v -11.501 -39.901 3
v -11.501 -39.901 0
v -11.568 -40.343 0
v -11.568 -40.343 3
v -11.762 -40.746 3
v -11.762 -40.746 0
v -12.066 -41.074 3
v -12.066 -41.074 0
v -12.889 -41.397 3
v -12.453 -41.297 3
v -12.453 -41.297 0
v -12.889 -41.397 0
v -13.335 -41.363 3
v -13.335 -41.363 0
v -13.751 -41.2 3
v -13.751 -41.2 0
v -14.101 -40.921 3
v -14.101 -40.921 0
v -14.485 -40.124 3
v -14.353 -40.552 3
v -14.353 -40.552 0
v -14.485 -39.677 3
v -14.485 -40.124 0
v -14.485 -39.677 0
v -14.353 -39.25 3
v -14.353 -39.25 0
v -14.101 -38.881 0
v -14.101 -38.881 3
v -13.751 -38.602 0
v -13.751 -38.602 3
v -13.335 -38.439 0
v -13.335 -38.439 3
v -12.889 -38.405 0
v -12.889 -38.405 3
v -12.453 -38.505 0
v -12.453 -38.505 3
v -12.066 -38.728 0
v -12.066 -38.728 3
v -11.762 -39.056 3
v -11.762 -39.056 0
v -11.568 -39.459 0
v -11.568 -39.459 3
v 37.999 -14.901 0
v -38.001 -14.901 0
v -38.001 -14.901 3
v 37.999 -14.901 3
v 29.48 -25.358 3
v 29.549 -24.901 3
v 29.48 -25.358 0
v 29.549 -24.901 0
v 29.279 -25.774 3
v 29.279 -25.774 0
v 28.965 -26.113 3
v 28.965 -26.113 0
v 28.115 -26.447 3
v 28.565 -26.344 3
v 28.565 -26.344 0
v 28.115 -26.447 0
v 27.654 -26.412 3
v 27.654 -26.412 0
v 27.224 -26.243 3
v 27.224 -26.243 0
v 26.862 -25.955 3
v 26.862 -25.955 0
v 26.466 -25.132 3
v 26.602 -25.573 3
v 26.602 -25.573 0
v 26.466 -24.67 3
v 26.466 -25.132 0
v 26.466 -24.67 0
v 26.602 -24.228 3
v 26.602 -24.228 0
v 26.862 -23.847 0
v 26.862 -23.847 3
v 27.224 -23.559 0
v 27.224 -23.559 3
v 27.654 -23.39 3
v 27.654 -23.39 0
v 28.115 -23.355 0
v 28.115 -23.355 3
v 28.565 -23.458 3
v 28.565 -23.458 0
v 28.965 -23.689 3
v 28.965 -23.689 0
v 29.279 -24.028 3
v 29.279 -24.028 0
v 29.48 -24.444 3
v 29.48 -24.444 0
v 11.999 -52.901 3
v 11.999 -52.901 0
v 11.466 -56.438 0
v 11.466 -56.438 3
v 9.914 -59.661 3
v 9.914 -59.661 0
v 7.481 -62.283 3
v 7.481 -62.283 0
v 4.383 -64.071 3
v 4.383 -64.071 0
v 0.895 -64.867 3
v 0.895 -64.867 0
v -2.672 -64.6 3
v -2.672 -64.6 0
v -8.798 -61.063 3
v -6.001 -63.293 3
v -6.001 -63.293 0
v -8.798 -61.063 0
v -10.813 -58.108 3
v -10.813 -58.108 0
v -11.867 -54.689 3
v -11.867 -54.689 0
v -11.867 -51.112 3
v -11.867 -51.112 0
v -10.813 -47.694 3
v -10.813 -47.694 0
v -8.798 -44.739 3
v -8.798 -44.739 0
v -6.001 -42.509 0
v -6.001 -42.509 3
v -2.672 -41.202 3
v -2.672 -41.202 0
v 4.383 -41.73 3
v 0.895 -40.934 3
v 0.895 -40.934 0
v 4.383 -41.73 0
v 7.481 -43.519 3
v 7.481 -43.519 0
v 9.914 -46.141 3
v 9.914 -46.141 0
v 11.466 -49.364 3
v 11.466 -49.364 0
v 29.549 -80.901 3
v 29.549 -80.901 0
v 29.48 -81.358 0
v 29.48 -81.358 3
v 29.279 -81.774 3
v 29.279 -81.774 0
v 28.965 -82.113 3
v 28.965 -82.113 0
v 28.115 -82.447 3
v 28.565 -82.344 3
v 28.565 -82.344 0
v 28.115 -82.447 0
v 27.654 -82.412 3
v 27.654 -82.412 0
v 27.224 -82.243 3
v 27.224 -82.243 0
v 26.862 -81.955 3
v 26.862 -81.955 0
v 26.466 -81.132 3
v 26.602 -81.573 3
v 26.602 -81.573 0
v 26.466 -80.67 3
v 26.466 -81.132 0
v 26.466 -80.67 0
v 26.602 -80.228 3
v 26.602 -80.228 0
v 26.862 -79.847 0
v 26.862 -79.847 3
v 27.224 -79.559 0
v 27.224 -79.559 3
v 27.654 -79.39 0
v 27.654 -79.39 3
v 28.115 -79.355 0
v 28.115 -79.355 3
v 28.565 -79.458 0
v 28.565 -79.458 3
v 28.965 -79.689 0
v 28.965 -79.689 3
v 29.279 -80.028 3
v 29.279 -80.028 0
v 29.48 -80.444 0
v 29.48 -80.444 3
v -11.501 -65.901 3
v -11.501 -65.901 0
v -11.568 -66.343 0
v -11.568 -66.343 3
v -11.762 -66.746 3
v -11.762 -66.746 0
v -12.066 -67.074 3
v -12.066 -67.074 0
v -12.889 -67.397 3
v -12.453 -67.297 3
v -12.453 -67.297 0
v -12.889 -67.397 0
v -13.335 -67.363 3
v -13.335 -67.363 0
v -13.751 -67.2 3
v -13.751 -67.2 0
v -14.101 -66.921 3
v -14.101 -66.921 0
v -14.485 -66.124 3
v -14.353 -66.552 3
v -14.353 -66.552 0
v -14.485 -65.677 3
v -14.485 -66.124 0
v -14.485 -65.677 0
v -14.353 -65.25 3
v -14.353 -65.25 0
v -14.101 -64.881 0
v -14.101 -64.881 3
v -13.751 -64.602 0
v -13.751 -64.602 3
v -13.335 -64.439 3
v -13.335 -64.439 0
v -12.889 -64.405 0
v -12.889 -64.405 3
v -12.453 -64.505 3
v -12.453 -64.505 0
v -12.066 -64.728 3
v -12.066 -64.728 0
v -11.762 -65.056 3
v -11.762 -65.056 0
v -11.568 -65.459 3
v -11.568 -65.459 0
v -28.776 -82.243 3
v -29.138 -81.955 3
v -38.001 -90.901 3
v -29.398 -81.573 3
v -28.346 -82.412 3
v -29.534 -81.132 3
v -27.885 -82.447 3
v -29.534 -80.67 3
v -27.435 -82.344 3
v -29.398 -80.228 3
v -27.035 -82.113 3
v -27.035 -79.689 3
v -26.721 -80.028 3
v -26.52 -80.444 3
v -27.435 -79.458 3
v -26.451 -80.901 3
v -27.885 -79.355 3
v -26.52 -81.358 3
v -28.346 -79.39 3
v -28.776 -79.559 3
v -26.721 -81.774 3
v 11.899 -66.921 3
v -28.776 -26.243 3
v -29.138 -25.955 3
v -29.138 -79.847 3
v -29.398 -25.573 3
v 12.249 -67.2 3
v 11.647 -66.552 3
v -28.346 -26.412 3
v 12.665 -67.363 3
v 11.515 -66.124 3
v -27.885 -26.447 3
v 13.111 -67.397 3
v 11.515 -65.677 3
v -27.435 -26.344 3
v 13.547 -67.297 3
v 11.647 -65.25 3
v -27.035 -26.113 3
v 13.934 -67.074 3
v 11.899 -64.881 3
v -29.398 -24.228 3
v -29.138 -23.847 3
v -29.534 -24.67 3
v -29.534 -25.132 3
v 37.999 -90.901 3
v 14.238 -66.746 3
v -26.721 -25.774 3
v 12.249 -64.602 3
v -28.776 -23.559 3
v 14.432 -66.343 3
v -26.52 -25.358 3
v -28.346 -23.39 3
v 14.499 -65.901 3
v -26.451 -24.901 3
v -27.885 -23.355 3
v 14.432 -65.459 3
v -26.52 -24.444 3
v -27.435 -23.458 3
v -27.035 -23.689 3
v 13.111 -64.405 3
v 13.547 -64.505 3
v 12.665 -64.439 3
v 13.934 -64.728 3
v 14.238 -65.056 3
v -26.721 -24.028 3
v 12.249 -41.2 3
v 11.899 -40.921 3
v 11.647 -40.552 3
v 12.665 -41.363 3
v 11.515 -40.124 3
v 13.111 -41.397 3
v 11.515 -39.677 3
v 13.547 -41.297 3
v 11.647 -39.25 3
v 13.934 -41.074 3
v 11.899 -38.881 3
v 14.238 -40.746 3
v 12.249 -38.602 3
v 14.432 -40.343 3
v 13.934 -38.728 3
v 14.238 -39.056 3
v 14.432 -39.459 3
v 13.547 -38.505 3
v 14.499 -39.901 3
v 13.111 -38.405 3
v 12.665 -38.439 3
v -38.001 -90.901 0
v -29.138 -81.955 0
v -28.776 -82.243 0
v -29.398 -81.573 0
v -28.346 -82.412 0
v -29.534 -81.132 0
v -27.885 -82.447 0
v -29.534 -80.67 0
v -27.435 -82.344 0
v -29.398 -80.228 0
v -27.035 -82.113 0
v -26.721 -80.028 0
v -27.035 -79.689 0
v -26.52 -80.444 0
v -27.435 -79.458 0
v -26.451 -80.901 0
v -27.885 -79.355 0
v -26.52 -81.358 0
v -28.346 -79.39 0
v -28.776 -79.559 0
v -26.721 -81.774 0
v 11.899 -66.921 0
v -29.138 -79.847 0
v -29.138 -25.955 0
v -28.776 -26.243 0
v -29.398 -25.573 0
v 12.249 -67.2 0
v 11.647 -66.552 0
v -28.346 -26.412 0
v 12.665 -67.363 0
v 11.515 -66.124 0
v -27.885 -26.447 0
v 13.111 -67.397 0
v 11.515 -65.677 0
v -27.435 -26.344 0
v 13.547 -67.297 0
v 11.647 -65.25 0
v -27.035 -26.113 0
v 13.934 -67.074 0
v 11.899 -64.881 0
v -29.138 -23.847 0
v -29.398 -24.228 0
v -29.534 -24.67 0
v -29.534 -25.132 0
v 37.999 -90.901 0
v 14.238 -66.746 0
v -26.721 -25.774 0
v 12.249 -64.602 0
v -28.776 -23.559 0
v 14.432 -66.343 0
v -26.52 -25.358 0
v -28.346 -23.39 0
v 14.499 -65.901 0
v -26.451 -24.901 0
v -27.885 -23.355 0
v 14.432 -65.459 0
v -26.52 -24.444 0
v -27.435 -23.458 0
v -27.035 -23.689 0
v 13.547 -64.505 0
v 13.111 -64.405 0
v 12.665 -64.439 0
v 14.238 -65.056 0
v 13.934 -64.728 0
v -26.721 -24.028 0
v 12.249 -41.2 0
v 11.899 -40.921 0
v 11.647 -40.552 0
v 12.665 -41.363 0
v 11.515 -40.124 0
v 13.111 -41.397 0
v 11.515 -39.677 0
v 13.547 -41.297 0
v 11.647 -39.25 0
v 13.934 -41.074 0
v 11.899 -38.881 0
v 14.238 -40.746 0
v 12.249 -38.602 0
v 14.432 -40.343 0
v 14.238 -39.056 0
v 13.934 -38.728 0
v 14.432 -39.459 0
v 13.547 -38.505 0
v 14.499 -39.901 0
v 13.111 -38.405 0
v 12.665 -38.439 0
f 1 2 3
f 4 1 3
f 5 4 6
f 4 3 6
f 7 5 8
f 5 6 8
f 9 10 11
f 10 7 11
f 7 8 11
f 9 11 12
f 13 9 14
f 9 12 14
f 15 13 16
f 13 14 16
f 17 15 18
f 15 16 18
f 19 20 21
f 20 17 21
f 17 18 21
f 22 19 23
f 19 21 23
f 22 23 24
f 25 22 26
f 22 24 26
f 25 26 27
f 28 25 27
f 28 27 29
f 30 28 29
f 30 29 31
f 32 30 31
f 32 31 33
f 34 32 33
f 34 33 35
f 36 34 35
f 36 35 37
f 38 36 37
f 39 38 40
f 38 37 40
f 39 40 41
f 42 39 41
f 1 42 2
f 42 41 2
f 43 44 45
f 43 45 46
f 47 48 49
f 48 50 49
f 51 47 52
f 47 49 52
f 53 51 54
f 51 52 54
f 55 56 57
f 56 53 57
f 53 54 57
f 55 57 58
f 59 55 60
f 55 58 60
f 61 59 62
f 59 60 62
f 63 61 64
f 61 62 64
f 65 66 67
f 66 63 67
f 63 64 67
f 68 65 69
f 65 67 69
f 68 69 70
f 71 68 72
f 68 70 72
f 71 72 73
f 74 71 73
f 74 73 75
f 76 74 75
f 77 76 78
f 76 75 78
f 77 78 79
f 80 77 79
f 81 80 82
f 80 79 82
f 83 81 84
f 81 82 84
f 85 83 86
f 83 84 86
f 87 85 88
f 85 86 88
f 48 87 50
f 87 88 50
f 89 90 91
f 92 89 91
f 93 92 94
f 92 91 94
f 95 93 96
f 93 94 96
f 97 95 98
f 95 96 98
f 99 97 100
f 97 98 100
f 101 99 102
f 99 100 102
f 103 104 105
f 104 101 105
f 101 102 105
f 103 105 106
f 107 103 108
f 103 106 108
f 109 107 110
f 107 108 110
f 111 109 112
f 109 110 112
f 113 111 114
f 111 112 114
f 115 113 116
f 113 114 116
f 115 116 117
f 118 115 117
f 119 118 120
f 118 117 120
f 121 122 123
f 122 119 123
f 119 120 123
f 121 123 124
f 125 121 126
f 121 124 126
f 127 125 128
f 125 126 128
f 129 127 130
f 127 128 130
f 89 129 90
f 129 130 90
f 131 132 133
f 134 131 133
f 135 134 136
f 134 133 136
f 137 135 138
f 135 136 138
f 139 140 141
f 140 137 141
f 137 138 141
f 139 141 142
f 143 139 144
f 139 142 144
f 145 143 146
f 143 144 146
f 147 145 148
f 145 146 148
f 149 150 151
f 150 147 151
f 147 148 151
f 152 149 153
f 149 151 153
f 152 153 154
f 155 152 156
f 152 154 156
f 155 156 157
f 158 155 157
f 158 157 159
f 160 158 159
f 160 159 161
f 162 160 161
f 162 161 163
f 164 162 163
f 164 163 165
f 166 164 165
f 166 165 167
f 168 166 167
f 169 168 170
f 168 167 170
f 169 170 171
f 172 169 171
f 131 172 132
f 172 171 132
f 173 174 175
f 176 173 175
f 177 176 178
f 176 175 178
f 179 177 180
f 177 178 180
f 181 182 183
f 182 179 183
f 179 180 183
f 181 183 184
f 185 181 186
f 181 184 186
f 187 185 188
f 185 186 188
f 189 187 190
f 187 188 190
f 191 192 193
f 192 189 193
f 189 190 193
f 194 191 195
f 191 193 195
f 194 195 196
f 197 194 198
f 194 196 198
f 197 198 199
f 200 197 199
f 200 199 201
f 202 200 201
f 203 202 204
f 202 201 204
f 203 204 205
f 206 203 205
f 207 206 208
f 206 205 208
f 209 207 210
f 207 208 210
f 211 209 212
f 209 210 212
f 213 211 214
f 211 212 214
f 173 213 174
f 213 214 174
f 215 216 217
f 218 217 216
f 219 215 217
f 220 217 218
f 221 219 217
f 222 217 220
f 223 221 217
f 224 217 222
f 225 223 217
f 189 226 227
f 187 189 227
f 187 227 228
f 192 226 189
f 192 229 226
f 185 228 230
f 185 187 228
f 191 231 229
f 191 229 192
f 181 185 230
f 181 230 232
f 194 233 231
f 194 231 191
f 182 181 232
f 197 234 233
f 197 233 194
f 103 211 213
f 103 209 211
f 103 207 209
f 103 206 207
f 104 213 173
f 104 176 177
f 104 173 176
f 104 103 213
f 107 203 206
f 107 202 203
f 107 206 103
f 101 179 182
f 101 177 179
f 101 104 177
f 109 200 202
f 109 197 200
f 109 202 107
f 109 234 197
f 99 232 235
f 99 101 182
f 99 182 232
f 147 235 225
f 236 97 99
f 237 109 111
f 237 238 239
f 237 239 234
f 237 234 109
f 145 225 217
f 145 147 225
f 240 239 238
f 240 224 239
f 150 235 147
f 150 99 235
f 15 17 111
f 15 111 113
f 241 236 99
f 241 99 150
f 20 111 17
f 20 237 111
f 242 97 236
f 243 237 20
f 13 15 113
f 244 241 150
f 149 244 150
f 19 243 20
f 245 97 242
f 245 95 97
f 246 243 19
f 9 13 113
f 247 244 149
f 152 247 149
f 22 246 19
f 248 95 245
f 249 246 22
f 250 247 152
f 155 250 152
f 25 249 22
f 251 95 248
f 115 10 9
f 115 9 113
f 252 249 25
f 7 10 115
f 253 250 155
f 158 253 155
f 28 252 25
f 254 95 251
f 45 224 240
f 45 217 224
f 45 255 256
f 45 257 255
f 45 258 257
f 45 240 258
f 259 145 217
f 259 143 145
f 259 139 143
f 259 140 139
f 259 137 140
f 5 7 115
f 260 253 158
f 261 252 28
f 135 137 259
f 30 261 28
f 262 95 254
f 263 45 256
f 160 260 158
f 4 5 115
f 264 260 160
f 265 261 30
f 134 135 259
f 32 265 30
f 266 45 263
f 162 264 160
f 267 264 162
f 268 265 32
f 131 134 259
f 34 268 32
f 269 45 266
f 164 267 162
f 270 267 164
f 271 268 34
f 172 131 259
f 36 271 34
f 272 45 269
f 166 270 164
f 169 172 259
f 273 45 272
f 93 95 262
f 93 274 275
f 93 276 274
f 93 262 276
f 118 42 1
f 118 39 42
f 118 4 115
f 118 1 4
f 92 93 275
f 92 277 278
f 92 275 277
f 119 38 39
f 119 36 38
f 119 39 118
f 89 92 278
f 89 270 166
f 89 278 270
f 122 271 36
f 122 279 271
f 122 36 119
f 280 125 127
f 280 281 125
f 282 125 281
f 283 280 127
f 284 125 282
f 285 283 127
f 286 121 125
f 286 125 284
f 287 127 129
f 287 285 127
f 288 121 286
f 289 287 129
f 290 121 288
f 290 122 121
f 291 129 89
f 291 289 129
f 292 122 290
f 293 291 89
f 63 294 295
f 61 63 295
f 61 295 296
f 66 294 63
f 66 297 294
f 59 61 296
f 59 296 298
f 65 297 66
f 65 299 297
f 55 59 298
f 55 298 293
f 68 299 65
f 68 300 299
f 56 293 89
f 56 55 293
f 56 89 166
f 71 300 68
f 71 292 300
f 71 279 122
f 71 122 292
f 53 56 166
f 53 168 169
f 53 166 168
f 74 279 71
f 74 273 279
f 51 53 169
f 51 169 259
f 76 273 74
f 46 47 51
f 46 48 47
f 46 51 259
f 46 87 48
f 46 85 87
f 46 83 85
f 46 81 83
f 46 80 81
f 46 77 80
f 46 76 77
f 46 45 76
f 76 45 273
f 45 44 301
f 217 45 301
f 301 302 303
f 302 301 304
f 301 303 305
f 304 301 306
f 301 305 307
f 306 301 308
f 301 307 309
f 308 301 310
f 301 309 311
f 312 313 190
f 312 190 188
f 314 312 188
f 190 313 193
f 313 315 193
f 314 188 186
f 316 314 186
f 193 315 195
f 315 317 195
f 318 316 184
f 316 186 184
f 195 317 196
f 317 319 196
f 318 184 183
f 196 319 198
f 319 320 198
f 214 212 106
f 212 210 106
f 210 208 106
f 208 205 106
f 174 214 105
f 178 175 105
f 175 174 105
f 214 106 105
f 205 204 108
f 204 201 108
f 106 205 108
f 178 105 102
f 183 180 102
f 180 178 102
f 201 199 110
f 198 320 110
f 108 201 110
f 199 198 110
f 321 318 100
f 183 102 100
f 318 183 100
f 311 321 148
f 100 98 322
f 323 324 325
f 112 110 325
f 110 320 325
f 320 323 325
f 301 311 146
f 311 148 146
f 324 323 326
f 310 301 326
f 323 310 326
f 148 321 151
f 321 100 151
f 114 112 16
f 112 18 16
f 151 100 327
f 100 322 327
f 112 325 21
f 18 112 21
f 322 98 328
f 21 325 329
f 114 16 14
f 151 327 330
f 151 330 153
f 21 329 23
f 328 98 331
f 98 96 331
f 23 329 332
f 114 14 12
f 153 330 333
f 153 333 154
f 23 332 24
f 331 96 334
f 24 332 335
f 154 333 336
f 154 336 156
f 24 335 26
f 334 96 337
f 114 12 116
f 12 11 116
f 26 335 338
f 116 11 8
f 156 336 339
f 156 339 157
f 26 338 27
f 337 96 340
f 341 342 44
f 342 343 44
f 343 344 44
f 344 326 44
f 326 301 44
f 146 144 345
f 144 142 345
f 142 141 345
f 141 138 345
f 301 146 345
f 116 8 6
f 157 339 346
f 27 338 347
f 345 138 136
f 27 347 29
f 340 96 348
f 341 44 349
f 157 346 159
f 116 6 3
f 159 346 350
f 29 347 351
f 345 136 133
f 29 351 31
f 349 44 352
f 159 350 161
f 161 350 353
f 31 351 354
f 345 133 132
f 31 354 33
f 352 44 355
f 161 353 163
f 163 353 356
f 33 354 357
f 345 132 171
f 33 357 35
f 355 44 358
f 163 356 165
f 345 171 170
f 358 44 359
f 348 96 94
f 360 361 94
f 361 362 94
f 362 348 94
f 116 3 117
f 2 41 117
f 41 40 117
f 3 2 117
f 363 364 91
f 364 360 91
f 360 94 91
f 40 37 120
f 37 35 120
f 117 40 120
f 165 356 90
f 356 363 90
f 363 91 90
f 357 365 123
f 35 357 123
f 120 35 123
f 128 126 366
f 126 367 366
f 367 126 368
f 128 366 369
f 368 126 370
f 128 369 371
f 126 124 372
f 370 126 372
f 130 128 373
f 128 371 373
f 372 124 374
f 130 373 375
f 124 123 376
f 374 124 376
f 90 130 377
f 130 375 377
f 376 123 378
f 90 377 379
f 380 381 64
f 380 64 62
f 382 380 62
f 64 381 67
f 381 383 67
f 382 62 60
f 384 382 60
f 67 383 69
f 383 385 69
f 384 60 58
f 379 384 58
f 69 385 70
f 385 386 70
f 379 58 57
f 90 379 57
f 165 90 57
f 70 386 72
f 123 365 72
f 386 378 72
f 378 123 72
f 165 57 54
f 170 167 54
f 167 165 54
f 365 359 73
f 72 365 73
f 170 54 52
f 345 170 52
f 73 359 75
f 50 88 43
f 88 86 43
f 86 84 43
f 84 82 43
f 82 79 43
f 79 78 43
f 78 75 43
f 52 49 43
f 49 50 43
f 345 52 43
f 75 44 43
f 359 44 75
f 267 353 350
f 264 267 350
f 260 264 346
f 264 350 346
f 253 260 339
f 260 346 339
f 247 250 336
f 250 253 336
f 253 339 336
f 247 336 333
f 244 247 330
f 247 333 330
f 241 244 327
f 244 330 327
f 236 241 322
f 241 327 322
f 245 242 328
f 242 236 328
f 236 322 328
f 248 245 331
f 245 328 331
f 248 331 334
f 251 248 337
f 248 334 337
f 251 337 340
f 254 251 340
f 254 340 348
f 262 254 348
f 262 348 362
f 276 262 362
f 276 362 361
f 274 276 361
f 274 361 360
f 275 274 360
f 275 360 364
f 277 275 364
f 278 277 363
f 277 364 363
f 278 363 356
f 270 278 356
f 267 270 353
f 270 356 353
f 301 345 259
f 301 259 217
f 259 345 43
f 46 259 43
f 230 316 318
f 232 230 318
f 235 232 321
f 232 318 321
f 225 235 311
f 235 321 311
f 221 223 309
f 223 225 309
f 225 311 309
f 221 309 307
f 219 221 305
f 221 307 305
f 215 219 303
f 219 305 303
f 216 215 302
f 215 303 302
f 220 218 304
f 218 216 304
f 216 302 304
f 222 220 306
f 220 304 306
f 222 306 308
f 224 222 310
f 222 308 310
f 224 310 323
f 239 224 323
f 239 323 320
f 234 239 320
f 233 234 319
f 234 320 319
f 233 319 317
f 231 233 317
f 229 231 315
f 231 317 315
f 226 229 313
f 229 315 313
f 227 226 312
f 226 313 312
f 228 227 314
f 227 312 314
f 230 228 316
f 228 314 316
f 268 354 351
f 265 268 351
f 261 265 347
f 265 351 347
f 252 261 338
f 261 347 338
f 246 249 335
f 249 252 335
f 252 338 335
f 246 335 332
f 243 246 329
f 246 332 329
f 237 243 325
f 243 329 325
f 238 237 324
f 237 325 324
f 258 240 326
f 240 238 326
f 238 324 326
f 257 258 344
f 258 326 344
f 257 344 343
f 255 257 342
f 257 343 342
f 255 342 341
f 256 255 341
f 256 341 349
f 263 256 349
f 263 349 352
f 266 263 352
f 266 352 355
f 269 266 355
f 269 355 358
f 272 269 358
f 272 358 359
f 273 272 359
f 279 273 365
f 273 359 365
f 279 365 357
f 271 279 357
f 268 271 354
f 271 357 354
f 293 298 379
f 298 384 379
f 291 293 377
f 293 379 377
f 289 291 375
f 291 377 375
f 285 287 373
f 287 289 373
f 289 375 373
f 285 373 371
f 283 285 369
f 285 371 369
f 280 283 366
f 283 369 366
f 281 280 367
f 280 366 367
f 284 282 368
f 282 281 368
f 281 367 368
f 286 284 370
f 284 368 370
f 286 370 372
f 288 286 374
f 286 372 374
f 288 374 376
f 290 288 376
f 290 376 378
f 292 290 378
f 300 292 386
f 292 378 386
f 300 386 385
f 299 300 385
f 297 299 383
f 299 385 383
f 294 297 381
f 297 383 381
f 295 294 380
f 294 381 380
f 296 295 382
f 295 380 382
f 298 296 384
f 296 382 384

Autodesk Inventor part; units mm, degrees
ref_plane "YZ Plane" through (0, 0, 0) normal (1, 0, 0) x (0, 1, 0)
ref_plane "XZ Plane" through (0, 0, 0) normal (0, 1, 0) x (-1, 0, 0)
ref_plane "XY Plane" through (0, 0, 0) normal (0, 0, 1) x (1, 0, 0)
ref_plane "РабПлоскость1" through (0, 0, 0) normal (0, 0, 1) x (1, 0, 0)
sketch "Эскиз1" plane through (0, 0, 0) normal (0, 0, 1) x (1, 0, 0)
  circle A0 centre (-28.0013, -80.9009) radius 1.55
  circle A1 centre (-28.0013, -24.9009) radius 1.55
  circle A2 centre (27.9987, -24.9009) radius 1.55
  circle A3 centre (27.9987, -80.9009) radius 1.55
  line L0 (37.9987, -90.9009) -> (37.9987, -14.9009)
  line L1 (37.9987, -90.9009) -> (-38.0013, -90.9009)
  line L2 (-38.0013, -14.9009) -> (37.9987, -14.9009)
  line L3 (-38.0013, -14.9009) -> (-38.0013, -90.9009)
  circle A4 centre (-0.0013, -52.9009) radius 12
  circle A5 centre (-13.0013, -65.9009) radius 1.5
  circle A6 centre (-13.0013, -39.9009) radius 1.5
  circle A7 centre (12.9987, -39.9009) radius 1.5
  circle A8 centre (12.9987, -65.9009) radius 1.5
  point P0 (0, 0)
  dimension "d4" = 24
extrude "Выдавливание1" add sketch "Эскиз1" along normal blind 3
properties part number "Держатель двигателя"
